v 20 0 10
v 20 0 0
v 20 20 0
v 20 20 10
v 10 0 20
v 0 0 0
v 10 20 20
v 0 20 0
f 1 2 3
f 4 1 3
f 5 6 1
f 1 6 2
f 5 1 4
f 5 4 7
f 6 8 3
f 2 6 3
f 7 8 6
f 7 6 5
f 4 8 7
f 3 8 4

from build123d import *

# Parameters (mm, degrees)
SKETCH1_W           = 20
SKETCH1_H           = 20
BOSS_EXTRUDE1_DEPTH = 20
CUT_EXTRUDE1_DEPTH  = 20
CUT_EXTRUDE2_DEPTH  = 20


with BuildPart() as part:
    # Sketch1 → Boss-Extrude1 (new body)
    with BuildSketch(Plane.XY):
        with Locations((10, 10)):
            Rectangle(SKETCH1_W, SKETCH1_H)
    extrude(amount=BOSS_EXTRUDE1_DEPTH)

    # Sketch2 → Cut-Extrude1 (cut)
    with BuildSketch(Plane(origin=(0, 20, 0), x_dir=(1, 0, 0), z_dir=(0, 1, 0))):
        Polygon((0, 0), (10, -20), (0, -20), align=None)
    extrude(amount=-CUT_EXTRUDE1_DEPTH, mode=Mode.SUBTRACT)

    # Sketch3 → Cut-Extrude2 (cut)
    with BuildSketch(Plane(origin=(0, 20, 0), x_dir=(1, 0, 0), z_dir=(0, 1, 0))):
        Polygon((20, -20), (20, -10), (10, -20), align=None)
    extrude(amount=-CUT_EXTRUDE2_DEPTH, mode=Mode.SUBTRACT)


solid = part.part
